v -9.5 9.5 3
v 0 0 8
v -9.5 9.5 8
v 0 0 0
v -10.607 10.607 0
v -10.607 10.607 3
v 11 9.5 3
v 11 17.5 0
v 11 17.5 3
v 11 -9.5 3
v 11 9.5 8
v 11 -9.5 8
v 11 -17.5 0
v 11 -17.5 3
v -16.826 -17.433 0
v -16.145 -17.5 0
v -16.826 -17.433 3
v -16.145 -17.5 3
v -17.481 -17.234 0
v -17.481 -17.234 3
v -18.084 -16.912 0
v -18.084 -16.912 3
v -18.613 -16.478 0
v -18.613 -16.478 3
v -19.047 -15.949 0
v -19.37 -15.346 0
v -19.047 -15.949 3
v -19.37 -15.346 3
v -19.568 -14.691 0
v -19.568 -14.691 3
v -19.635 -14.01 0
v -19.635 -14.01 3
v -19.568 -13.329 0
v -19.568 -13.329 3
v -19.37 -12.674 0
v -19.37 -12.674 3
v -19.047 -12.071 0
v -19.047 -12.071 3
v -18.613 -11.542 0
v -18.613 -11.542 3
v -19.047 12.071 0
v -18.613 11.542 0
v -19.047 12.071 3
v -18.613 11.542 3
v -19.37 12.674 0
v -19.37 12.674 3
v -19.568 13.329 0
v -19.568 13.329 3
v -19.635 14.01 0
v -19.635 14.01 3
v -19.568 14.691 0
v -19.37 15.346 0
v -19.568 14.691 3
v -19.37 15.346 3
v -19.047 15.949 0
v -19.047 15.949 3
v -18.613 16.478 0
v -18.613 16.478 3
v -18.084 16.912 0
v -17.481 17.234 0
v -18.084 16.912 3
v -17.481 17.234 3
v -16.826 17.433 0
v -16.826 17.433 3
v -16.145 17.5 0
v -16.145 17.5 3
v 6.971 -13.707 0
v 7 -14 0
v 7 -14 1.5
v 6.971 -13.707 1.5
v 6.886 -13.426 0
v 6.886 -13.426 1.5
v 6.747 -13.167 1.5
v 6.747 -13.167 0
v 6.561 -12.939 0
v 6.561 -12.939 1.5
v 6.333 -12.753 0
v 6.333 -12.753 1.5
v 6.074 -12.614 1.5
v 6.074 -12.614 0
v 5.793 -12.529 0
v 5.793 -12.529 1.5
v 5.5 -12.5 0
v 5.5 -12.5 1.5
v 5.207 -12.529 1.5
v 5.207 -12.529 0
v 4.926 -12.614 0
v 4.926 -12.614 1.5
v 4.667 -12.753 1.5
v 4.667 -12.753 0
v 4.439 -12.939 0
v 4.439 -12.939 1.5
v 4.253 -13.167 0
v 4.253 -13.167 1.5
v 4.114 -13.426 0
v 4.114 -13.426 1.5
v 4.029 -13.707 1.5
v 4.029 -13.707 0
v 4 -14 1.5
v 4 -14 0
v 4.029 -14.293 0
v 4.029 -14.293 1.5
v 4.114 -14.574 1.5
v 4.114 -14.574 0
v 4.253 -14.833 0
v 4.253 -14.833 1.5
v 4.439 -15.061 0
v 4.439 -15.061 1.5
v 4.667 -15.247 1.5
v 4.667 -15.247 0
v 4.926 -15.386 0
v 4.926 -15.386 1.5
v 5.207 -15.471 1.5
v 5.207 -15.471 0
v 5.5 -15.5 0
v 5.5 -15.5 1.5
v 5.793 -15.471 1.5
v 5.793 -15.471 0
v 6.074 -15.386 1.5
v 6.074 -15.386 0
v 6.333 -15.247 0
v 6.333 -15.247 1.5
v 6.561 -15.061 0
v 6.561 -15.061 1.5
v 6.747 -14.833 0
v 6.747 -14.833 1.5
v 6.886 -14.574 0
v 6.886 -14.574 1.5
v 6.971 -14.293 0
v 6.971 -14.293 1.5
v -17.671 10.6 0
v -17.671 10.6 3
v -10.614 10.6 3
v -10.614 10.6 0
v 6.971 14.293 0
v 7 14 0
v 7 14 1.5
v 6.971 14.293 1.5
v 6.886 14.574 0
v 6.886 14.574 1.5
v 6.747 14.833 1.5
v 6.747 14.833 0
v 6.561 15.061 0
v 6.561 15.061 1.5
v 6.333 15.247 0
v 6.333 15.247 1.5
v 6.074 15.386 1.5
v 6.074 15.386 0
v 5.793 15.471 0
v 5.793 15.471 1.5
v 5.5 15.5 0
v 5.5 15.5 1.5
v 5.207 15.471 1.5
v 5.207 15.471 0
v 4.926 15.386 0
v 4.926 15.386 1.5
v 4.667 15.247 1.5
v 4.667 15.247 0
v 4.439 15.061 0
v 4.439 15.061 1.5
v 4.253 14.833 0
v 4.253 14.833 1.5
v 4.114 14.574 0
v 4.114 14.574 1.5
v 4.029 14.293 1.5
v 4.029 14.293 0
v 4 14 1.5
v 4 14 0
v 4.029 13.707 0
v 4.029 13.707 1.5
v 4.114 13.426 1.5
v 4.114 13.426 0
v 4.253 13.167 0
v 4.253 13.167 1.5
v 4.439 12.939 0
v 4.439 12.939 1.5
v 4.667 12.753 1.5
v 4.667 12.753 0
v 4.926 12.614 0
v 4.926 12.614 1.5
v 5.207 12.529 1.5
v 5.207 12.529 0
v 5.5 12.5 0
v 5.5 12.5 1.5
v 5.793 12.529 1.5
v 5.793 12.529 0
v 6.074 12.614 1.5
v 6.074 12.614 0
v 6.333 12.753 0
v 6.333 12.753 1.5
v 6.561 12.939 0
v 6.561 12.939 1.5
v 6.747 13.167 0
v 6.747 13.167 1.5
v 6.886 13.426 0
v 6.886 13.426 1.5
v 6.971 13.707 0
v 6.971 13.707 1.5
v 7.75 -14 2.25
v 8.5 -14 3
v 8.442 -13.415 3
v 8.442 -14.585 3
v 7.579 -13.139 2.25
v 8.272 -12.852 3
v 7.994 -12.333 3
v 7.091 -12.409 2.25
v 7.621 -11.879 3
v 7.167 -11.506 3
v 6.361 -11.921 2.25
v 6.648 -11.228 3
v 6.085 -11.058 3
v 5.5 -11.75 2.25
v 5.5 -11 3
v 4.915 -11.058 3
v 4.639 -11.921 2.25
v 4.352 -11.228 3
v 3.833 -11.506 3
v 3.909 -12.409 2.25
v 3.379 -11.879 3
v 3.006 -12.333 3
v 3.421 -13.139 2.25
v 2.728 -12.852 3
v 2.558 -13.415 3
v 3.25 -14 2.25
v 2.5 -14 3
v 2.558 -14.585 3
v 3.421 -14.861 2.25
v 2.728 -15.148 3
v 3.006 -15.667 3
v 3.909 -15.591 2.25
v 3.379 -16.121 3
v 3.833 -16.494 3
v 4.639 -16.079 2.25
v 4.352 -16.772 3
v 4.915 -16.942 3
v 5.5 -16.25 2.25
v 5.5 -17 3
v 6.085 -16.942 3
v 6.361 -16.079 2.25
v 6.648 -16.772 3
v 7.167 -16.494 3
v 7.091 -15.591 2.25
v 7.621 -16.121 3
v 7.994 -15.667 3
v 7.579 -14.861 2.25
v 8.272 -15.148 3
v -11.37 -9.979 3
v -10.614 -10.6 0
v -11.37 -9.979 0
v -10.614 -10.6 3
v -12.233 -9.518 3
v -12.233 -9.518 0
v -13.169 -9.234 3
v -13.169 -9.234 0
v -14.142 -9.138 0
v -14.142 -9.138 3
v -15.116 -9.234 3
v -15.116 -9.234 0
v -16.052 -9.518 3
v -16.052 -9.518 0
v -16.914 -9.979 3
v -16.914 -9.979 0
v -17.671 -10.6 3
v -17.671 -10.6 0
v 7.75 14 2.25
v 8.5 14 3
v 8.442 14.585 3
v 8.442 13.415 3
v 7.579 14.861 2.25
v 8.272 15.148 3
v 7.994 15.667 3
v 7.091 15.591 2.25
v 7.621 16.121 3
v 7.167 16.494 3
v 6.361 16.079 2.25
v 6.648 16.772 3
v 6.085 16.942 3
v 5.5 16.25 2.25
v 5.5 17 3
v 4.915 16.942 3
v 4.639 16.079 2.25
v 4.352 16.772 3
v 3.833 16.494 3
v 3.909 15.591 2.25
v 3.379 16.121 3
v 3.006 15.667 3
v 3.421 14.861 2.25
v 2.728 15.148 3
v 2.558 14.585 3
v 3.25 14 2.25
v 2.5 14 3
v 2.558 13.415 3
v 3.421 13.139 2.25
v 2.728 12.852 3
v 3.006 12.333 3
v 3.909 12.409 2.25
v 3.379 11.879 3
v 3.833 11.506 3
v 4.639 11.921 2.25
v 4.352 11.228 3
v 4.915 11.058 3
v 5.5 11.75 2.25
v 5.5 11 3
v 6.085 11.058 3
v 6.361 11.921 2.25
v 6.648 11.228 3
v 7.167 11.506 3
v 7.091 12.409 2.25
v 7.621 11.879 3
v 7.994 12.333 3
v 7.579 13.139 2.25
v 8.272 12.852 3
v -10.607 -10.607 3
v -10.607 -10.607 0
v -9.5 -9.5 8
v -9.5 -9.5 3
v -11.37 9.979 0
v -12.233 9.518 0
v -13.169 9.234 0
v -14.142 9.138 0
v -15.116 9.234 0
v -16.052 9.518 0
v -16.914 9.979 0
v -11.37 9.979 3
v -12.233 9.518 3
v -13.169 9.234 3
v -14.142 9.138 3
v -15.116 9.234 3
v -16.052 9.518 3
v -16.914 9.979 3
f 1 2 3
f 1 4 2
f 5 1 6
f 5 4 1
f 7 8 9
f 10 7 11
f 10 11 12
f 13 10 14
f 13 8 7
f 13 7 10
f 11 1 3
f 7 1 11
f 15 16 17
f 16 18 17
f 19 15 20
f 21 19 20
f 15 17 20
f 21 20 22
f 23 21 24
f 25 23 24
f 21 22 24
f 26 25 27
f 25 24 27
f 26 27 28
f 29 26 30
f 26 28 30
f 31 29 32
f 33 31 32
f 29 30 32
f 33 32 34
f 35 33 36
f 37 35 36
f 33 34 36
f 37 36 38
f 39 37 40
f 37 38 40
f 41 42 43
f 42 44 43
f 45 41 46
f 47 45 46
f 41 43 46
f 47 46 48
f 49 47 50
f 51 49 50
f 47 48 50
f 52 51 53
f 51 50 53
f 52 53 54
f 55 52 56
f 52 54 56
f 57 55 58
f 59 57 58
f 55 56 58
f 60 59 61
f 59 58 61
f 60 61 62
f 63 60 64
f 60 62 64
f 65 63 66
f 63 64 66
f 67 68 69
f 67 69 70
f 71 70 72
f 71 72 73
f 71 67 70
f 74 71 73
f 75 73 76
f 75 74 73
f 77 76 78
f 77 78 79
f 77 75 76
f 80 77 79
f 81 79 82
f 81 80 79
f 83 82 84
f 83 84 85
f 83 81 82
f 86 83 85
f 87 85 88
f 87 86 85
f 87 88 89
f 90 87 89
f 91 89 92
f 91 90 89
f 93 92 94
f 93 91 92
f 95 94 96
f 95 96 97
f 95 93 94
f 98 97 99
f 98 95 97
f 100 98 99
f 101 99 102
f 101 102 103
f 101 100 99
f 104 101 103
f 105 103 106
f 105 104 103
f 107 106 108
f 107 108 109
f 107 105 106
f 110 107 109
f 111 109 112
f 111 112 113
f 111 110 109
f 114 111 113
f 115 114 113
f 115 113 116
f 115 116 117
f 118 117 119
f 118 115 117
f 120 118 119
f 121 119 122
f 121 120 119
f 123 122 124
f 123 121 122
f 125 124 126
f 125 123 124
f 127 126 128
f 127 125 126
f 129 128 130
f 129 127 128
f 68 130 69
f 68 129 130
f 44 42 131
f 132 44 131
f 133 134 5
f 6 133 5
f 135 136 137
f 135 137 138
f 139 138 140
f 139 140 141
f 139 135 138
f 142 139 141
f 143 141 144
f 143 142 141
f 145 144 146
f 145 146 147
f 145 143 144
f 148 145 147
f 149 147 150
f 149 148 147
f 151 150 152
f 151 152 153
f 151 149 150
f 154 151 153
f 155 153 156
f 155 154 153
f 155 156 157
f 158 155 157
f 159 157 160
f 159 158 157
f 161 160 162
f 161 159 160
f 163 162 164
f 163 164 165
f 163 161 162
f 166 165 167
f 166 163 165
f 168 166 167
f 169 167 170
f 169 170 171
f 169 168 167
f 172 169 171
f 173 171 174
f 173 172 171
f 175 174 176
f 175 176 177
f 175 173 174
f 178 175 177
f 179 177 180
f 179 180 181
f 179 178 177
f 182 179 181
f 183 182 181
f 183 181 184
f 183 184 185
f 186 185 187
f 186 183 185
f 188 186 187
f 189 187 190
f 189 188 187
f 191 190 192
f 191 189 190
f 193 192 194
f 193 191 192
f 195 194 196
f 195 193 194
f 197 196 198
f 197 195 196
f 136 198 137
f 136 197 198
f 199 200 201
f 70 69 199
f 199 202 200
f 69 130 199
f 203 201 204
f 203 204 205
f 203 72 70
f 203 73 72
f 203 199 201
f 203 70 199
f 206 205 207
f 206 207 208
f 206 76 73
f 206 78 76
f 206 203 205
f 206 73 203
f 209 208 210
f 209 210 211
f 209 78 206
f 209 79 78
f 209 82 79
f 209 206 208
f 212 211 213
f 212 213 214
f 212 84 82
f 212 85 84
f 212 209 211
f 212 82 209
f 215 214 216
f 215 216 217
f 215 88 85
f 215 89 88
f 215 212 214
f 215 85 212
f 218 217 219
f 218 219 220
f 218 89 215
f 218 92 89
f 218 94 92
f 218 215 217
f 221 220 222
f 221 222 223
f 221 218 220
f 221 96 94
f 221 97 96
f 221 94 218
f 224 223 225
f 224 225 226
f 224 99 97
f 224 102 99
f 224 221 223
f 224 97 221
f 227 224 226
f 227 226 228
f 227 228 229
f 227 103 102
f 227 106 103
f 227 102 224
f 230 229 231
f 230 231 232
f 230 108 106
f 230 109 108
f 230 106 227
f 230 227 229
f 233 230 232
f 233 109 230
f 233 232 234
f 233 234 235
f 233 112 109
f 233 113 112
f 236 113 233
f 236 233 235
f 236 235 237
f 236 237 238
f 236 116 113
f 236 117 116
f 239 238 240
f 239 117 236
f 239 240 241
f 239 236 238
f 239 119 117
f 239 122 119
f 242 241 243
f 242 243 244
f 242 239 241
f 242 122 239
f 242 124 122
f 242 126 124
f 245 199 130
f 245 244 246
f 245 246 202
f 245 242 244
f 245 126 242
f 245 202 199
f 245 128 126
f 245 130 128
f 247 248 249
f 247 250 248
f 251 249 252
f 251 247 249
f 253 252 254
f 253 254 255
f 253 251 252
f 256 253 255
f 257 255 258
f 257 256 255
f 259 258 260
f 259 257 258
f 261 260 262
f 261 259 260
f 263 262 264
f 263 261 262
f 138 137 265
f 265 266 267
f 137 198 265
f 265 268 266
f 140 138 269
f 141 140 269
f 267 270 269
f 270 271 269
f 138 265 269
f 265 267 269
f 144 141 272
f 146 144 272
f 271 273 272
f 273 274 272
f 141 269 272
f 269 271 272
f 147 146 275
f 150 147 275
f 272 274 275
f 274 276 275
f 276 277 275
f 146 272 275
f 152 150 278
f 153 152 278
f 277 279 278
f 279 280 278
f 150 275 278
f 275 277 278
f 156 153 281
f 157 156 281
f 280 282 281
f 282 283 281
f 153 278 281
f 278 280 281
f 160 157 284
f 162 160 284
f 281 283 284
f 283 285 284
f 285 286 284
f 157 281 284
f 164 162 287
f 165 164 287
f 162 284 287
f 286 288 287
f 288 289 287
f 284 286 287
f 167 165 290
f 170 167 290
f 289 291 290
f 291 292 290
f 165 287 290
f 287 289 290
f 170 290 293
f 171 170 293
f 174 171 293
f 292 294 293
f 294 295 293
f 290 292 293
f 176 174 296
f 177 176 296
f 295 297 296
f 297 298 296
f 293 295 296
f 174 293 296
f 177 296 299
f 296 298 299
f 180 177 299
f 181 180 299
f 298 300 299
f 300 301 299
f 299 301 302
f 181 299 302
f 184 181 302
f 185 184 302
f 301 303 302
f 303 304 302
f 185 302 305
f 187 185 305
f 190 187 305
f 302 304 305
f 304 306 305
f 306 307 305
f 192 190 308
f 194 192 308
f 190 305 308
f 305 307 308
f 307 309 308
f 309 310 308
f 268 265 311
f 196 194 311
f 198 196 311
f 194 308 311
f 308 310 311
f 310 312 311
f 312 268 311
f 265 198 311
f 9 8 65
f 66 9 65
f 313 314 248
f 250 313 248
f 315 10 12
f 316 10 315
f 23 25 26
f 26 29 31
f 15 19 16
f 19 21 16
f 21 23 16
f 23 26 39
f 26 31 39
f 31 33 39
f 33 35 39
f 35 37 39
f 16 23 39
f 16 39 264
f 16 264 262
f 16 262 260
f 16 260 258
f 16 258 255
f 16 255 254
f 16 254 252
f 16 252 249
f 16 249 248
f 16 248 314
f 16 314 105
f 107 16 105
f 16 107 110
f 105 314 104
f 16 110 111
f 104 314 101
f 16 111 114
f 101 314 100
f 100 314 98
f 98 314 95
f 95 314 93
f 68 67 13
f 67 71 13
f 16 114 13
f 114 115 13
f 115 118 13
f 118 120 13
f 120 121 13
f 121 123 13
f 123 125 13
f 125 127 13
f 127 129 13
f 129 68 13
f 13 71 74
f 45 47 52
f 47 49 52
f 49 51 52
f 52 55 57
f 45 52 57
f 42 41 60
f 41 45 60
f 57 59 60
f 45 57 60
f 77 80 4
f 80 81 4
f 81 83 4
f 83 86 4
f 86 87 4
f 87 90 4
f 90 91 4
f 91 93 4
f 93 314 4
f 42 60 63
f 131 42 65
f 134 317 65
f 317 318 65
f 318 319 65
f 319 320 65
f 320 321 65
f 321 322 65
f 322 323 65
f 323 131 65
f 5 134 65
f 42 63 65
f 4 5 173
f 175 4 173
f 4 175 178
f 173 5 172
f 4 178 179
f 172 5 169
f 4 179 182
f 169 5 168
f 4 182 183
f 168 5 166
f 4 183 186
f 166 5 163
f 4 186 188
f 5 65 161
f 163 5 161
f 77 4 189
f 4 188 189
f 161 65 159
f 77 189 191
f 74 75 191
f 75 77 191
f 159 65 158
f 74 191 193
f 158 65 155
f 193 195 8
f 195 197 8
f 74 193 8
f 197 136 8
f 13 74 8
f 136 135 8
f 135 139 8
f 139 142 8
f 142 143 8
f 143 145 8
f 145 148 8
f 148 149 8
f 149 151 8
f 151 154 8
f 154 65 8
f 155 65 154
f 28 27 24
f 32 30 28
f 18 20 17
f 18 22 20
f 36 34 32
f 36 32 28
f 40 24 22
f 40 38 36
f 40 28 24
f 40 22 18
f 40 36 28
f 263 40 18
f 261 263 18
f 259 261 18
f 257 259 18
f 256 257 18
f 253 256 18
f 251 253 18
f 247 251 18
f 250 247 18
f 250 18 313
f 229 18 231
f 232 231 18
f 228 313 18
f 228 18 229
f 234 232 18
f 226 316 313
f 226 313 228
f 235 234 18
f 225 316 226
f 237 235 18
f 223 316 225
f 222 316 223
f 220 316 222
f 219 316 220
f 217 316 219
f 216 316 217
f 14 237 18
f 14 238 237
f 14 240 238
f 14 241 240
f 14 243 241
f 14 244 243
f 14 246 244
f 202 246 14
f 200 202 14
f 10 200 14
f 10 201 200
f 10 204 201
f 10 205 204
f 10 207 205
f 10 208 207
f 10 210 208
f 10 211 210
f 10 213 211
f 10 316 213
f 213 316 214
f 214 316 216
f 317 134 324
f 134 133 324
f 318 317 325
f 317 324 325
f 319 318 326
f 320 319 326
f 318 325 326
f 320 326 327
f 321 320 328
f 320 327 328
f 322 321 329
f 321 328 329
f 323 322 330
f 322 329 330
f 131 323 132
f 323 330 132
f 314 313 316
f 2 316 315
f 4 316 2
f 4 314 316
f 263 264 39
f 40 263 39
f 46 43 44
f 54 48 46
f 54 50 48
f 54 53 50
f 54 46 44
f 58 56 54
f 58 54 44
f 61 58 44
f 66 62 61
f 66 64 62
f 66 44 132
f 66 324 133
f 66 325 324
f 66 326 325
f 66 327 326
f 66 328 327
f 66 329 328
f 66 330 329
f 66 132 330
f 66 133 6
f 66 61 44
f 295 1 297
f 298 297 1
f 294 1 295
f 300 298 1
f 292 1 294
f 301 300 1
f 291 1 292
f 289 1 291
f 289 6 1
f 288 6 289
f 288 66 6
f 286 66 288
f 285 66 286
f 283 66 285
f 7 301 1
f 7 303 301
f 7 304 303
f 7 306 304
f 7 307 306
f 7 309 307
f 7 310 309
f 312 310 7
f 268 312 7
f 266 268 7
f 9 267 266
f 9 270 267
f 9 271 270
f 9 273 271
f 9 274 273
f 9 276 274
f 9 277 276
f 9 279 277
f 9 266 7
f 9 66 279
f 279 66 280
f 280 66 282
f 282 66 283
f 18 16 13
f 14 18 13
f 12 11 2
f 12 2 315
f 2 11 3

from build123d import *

# Parameters (mm, degrees)
SKETCH_R     = 1.5
PAD_DEPTH    = 3
FILLET_R     = 4.99
FILLET001_R  = 3.49
PAD001_DEPTH = 5
CHAMFER_SIZE = 1.5


with BuildPart() as part:
    # Sketch → Pad (new body)
    with BuildSketch(Plane.XY):
        Polygon((-10.606602, 10.606602), (0, 0), (-10.606602, -10.606602), (-14.142136, -7.071068), (-24.571068, -17.5), (11, -17.5), (11, 17.5), (-24.571068, 17.5), (-14.142136, 7.071068), align=None)
        with Locations((5.5, 14)):
            Circle(SKETCH_R, mode=Mode.SUBTRACT)
        with Locations((5.5, -14)):
            Circle(SKETCH_R, mode=Mode.SUBTRACT)
    extrude(amount=PAD_DEPTH)

    # Fillet
    fillet_edges = [part.edges().sort_by_distance(p)[0] for p in [
        (-14.142136, -7.071068, 1.5),
        (-14.142136, 7.071068, 1.5),
    ]]
    fillet(fillet_edges, radius=FILLET_R)

    # Fillet001
    fillet001_edges = [part.edges().sort_by_distance(p)[0] for p in [
        (-24.571068, -17.5, 1.5),
        (-24.571068, 17.5, 1.5),
    ]]
    fillet(fillet001_edges, radius=FILLET001_R)

    # Sketch001 (on Face17 of Fillet001) → Pad001 (join)
    with BuildSketch(Plane.XY.offset(3)):
        Polygon((-9.5, 9.5), (11, 9.5), (11, -9.5), (-9.5, -9.5), (0, 0), align=None)
    extrude(amount=PAD001_DEPTH)

    # Chamfer
    chamfer_edges = [part.edges().sort_by_distance(p)[0] for p in [
        (4, -14, 3),
        (4, 14, 3),
    ]]
    chamfer(chamfer_edges, length=CHAMFER_SIZE)


solid = part.part
